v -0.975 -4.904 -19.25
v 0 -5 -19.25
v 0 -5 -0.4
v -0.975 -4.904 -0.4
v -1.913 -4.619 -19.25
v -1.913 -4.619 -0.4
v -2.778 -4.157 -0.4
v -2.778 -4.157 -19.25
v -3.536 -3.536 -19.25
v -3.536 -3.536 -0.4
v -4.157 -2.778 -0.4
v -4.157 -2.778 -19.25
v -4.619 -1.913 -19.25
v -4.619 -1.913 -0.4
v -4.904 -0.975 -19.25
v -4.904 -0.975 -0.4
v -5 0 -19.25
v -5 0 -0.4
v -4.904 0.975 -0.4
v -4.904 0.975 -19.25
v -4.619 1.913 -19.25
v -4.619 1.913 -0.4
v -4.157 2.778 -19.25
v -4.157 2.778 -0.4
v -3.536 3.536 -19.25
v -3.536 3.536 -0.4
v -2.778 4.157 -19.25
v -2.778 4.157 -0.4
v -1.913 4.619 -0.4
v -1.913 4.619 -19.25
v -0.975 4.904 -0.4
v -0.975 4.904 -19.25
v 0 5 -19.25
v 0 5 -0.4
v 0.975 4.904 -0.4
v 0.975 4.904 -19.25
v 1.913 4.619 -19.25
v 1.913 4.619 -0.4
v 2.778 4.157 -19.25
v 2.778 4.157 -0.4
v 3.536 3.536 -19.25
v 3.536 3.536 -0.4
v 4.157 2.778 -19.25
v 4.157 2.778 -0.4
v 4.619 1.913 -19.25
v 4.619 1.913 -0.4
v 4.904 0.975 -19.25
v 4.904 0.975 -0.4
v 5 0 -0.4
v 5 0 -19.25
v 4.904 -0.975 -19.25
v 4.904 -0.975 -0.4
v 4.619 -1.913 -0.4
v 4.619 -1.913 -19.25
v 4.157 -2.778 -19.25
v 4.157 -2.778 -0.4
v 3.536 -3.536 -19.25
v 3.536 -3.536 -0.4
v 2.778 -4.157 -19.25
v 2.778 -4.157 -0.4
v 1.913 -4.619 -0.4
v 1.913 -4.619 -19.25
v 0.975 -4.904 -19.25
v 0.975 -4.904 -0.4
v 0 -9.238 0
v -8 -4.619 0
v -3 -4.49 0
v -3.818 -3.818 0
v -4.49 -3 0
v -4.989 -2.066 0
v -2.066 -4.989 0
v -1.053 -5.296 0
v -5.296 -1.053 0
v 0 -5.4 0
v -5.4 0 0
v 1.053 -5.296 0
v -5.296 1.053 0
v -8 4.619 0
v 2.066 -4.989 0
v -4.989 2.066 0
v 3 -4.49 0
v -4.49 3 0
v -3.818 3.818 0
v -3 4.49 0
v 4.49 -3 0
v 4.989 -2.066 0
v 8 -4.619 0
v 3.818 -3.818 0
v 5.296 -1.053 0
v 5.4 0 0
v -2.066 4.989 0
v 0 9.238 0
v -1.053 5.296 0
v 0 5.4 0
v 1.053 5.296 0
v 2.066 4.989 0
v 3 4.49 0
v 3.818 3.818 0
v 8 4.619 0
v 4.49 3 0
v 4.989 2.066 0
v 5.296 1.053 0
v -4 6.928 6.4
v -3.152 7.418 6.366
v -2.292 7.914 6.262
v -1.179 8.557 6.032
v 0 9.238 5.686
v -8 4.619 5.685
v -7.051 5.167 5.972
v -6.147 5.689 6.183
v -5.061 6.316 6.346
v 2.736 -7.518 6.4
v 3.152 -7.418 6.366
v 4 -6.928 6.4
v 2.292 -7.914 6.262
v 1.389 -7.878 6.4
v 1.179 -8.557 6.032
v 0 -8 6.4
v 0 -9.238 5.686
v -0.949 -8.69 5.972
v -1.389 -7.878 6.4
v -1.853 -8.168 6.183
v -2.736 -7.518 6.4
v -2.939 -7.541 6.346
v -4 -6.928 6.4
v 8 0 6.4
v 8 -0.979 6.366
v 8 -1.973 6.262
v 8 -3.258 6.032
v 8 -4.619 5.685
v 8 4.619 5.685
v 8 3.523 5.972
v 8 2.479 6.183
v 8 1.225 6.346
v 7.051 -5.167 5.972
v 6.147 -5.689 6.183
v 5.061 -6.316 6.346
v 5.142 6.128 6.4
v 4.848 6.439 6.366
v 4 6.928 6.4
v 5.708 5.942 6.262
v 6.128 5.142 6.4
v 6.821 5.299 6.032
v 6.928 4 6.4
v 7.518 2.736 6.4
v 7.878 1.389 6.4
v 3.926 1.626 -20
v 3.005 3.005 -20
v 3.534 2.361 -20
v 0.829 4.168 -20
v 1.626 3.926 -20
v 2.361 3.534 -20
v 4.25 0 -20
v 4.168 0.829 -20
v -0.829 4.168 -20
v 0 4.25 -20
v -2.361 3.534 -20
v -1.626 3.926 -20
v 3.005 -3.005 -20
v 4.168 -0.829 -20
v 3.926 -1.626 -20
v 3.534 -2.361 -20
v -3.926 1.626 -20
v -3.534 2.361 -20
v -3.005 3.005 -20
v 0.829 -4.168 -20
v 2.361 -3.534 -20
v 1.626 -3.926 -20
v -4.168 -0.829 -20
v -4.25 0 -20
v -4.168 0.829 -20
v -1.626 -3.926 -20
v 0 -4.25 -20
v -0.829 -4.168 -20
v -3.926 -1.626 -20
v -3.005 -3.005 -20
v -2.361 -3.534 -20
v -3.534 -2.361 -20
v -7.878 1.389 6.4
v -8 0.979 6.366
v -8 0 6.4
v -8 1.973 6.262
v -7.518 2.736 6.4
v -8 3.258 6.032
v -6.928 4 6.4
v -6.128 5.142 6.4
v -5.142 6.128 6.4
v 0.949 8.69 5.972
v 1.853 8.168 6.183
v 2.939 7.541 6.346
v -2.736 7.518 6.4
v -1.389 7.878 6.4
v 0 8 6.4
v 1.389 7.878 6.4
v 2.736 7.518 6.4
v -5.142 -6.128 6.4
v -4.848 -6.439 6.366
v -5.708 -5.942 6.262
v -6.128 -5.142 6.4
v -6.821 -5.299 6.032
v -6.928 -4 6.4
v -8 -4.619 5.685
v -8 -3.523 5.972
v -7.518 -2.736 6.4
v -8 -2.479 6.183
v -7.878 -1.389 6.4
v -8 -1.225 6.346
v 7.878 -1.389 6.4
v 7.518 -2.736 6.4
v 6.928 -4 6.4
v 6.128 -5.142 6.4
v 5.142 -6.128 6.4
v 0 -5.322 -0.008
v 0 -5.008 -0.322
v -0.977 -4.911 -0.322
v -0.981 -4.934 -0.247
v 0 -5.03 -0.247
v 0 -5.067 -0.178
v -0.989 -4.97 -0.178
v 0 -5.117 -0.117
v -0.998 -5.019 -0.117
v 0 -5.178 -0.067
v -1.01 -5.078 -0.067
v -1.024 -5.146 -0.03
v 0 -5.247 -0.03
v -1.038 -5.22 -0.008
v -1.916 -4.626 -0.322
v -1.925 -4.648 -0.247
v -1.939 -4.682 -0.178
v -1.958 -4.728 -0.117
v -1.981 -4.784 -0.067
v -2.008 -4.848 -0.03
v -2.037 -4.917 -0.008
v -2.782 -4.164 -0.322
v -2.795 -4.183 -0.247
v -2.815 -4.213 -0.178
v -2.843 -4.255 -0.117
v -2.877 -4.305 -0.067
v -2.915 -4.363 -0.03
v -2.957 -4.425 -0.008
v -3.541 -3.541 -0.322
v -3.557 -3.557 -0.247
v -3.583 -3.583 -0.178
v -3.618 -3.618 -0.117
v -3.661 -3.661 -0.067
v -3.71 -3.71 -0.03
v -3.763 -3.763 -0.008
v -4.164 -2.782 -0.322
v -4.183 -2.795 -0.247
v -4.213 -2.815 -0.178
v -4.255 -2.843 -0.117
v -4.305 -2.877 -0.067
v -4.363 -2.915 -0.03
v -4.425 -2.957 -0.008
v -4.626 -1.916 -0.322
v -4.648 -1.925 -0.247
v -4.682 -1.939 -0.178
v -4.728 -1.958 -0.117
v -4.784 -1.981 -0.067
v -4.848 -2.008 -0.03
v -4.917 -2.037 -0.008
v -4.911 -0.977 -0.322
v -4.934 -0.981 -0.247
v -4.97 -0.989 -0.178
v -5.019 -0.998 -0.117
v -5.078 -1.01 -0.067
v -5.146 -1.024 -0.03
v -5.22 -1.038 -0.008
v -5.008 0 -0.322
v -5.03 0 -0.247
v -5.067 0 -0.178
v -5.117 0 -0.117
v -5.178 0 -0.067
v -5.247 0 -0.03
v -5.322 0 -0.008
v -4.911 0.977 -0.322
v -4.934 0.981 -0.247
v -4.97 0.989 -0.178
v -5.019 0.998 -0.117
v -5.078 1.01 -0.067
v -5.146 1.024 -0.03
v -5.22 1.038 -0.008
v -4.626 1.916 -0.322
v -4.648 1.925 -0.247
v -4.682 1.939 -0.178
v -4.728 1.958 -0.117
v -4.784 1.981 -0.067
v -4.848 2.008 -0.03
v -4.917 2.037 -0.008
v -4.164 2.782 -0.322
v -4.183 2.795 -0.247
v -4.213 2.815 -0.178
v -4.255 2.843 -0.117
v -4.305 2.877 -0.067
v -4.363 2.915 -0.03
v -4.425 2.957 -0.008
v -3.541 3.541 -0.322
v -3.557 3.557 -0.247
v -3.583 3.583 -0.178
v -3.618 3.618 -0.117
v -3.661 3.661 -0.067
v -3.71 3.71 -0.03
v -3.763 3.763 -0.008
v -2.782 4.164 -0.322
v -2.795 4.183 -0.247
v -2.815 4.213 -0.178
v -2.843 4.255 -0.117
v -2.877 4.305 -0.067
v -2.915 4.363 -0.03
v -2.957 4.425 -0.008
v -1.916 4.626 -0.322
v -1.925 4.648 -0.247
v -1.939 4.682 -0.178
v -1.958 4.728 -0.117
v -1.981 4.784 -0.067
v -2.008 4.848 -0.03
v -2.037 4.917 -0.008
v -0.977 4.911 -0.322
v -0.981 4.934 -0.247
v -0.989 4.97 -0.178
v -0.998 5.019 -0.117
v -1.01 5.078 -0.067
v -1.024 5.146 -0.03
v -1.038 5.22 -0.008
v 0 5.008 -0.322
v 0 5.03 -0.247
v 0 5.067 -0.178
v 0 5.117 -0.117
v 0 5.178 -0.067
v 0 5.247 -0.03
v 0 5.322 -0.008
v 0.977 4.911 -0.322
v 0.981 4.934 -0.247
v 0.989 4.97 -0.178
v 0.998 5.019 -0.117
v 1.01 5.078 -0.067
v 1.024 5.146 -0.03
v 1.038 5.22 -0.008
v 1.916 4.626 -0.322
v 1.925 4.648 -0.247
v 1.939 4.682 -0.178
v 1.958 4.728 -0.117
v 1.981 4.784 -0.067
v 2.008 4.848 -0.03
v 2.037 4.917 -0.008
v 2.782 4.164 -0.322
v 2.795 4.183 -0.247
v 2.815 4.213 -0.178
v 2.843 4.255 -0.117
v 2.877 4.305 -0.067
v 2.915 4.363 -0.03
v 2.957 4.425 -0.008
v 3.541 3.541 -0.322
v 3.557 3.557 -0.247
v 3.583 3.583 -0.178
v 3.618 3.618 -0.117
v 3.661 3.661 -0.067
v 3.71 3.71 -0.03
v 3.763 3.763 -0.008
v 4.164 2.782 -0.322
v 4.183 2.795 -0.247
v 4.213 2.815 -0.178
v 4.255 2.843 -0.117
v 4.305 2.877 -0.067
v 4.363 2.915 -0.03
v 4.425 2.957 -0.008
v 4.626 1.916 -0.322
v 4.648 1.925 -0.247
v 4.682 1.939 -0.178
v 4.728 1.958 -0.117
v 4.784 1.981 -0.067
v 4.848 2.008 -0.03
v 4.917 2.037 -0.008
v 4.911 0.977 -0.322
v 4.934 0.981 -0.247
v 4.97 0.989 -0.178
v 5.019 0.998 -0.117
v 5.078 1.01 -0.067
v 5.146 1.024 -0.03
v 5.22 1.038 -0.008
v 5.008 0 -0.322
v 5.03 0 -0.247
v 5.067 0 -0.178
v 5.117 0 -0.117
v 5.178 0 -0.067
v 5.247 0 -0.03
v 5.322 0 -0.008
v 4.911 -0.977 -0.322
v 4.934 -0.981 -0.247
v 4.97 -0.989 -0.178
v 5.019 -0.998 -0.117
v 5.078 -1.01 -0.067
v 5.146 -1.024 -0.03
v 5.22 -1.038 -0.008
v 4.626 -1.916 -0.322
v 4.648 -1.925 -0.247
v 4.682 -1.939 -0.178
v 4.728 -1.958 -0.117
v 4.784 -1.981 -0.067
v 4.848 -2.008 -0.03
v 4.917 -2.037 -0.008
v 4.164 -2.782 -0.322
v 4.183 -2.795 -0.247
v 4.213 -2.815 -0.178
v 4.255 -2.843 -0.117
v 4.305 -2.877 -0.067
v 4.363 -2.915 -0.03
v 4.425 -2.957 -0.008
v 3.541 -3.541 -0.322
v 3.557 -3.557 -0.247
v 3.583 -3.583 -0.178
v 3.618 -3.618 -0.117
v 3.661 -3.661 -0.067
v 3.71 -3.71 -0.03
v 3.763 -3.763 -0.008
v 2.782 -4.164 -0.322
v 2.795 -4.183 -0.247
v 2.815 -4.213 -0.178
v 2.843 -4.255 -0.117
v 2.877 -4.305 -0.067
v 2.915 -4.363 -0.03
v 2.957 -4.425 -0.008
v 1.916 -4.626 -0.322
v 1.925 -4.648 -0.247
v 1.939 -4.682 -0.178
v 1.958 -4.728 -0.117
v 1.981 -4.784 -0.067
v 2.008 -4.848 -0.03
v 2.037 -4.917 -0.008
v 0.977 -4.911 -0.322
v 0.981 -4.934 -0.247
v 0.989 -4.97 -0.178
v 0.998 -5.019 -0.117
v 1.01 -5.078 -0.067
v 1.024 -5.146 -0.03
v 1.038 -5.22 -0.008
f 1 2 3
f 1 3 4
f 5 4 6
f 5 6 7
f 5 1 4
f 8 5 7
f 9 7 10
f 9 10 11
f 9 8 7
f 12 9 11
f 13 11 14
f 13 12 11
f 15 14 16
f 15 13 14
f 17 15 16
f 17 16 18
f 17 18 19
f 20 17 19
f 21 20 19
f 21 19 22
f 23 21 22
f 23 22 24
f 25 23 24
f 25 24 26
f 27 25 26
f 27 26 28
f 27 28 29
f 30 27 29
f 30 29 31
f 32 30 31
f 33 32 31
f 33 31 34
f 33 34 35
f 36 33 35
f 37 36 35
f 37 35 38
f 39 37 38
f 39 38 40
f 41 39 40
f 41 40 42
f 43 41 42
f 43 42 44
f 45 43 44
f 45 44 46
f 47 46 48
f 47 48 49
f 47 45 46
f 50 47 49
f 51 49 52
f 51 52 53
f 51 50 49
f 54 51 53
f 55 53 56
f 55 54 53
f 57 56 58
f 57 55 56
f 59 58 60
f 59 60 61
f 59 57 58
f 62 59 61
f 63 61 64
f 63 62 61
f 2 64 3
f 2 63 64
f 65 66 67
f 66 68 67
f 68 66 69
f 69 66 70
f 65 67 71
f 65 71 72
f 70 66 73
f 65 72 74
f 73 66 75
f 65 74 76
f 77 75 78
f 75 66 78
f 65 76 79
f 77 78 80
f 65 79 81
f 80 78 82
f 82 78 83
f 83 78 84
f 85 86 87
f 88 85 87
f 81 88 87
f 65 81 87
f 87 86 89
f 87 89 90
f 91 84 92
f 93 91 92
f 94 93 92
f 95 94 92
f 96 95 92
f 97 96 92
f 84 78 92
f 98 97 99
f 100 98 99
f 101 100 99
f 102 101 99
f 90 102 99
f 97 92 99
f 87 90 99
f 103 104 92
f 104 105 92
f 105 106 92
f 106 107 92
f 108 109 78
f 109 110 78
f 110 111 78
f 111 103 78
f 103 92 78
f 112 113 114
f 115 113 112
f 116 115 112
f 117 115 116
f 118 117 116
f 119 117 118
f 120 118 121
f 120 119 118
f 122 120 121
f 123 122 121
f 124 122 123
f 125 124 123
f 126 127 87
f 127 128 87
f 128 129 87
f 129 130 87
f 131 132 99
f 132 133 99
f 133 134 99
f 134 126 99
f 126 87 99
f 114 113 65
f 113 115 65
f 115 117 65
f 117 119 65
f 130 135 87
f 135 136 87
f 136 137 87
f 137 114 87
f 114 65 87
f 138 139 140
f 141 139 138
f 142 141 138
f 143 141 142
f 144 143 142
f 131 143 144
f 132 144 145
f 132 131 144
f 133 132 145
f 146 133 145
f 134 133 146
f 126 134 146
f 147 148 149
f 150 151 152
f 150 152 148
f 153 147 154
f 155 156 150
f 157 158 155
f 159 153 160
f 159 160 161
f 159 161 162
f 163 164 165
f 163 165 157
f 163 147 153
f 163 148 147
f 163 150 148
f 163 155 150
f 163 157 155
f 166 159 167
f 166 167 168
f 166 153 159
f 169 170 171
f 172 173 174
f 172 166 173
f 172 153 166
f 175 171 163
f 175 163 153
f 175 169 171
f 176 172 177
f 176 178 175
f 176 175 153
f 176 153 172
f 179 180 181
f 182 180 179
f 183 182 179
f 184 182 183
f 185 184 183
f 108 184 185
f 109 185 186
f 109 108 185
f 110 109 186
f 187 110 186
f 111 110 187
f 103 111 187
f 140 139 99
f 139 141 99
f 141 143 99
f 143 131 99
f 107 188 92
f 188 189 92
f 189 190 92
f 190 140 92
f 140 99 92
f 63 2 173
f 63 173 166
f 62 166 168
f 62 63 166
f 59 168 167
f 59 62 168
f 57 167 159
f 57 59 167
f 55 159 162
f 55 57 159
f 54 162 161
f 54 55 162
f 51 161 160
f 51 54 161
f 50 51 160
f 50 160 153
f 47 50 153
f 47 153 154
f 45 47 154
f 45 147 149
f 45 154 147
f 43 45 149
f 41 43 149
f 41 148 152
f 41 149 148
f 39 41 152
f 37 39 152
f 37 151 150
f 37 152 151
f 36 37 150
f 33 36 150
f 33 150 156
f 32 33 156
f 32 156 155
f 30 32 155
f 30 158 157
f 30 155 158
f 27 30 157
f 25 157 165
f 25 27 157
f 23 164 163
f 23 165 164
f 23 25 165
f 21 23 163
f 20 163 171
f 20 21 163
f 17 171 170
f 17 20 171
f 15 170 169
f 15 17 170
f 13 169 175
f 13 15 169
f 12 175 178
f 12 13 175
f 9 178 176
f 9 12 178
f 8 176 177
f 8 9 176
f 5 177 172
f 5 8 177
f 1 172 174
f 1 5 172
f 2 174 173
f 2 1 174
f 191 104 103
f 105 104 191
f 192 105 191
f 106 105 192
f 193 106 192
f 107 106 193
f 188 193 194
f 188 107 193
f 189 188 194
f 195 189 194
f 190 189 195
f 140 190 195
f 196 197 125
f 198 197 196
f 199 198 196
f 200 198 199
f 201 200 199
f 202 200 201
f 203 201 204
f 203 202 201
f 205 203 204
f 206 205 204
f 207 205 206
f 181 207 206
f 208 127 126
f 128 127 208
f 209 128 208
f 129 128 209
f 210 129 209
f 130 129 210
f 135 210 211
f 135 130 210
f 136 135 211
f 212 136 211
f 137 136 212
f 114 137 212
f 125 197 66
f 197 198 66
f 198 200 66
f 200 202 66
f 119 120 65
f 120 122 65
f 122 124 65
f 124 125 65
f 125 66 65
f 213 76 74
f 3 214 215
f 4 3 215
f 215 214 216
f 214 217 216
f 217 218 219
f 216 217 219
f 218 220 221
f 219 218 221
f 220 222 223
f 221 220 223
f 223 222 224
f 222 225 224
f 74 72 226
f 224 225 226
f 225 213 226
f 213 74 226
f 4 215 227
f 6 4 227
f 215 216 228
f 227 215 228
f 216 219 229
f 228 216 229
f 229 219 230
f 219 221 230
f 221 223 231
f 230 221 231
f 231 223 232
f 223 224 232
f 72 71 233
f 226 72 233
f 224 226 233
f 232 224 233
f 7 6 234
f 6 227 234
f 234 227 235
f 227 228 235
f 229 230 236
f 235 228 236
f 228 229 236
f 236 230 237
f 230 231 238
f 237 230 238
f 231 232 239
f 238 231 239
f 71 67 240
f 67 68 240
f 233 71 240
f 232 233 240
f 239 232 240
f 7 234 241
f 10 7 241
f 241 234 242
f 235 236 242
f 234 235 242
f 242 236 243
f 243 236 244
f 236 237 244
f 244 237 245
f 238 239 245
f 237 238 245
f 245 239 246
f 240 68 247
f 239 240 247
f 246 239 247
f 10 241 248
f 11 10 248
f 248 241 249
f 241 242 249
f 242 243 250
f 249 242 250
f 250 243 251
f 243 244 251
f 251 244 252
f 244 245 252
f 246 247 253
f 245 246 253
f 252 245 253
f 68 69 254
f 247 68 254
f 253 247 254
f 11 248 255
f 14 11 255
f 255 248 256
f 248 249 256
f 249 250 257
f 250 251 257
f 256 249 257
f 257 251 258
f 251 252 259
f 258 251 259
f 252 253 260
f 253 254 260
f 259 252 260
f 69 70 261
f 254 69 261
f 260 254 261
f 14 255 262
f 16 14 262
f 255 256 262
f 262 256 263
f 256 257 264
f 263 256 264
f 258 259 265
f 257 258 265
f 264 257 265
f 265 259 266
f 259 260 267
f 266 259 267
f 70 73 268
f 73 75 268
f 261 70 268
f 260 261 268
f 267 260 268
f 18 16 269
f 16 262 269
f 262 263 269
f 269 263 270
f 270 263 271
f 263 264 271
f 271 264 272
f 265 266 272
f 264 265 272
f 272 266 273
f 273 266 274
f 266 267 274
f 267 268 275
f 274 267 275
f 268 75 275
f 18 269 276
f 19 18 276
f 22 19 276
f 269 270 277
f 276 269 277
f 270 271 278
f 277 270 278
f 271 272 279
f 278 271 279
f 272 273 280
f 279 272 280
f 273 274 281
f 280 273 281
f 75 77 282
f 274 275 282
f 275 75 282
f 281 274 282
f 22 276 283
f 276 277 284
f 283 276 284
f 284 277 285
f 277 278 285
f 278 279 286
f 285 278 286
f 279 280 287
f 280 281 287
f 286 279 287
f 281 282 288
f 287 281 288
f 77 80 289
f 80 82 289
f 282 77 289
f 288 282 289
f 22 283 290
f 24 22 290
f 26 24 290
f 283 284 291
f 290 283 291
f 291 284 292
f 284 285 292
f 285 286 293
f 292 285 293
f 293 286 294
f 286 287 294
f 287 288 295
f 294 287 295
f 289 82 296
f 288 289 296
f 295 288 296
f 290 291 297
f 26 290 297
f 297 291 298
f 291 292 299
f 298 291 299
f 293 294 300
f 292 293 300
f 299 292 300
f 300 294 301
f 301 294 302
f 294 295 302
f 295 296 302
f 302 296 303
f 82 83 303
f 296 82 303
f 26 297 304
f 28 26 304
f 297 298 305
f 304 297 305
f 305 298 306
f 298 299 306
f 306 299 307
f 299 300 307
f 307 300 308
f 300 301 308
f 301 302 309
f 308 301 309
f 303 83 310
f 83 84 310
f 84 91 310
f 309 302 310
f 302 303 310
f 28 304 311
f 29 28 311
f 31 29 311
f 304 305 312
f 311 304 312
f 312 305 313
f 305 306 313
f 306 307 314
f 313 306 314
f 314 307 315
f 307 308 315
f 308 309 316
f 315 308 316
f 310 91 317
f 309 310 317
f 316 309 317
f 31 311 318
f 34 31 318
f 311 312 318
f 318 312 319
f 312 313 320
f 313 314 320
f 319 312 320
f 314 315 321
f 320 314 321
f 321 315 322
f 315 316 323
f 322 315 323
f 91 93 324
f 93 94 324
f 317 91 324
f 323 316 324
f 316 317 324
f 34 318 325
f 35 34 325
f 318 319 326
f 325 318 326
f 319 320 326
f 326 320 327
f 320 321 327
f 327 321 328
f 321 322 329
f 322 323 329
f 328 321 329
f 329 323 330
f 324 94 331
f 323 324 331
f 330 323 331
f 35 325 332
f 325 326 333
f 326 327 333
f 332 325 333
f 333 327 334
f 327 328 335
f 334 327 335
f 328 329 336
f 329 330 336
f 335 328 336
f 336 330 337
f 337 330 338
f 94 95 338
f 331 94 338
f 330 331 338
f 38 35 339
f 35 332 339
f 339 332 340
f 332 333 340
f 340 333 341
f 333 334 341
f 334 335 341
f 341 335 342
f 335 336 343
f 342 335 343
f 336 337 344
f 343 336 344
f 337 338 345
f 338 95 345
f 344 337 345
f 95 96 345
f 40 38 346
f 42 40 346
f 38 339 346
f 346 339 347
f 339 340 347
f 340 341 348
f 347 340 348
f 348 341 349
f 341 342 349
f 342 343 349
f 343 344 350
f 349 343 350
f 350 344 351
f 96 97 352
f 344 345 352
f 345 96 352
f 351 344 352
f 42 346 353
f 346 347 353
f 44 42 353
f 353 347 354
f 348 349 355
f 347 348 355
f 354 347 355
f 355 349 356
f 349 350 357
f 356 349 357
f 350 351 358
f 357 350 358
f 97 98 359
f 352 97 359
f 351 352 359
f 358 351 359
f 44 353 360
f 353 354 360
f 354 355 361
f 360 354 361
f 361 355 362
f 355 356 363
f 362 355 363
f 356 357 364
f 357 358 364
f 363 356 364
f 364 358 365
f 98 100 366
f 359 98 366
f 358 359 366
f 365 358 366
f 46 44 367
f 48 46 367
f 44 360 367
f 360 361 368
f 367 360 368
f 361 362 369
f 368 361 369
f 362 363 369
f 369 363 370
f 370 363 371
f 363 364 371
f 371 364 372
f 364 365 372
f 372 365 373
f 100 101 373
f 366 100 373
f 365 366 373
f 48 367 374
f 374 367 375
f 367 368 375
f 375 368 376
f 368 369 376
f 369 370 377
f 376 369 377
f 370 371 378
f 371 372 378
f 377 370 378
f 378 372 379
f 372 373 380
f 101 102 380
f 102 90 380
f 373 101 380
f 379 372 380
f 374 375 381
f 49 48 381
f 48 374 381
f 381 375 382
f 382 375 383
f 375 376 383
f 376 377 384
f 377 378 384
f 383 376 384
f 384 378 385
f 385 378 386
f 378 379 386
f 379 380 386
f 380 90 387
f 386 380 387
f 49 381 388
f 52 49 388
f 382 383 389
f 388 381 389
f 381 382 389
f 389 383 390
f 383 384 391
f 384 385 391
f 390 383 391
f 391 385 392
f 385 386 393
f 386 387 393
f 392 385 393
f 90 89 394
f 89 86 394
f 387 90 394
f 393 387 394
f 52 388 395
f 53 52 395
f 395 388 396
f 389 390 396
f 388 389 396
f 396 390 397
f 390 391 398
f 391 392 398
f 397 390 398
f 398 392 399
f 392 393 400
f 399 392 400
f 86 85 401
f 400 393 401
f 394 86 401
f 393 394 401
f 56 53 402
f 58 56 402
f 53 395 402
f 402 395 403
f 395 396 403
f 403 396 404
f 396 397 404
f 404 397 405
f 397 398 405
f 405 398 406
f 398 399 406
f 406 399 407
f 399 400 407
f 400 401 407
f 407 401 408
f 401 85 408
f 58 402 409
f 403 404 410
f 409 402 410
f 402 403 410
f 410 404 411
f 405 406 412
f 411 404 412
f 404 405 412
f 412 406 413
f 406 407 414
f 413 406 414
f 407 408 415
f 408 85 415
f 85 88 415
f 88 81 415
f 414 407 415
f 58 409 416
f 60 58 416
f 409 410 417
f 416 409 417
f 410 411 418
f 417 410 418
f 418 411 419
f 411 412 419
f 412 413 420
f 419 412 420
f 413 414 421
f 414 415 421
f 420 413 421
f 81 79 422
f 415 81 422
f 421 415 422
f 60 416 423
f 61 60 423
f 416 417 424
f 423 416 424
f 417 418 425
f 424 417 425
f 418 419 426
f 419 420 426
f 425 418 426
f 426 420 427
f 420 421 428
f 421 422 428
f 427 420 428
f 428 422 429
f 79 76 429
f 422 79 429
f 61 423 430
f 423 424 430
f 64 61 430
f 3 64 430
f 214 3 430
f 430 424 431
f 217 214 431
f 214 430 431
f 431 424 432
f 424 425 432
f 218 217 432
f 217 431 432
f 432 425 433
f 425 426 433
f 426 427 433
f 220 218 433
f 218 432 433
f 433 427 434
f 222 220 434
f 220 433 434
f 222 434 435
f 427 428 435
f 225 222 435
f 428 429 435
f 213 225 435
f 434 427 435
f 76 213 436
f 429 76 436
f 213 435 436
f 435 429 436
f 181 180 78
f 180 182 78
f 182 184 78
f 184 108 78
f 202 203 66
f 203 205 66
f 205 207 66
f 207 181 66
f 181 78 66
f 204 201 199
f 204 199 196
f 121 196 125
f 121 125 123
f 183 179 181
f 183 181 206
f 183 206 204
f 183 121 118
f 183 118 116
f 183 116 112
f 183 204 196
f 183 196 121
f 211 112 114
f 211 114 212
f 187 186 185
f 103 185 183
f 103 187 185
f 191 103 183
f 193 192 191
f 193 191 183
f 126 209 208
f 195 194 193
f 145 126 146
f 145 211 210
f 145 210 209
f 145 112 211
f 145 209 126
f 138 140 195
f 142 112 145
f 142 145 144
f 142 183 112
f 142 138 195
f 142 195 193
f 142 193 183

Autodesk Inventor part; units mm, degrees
ref_plane "WorkPlane1" through (0, 0, 0) normal (0, 0, 1) x (1, 0, 0)
sketch "Sketch1" plane through (0, 0, 0) normal (0, 0, 1) x (1, 0, 0)
  point P0 (0, 0)
sketch "Sketch2" plane through (0, 0, 0) normal (0, 0, 1) x (1, 0, 0)
  line L0 (-8, 4.6189) -> (-8, -4.6189)
  line L1 (0, 9.2375) -> (-8, 4.6189)
  line L2 (8, 4.6189) -> (0, 9.2375)
  line L3 (8, -4.6189) -> (8, 4.6189)
  line L4 (0, -9.2375) -> (8, -4.6189)
  line L5 (-8, -4.6189) -> (0, -9.2375)
  circle A0 centre (0, 0) radius 8 construction
  dimension "d1" = 16
  dimension "d29" = 0
  dimension "d30" = 0
extrude "Extrusion1" add sketch "Sketch2" along normal blind 6.4
sketch "Sketch3" plane through (0, 0, 0) normal (1, 0, 0) x (0, 1, 0)
  line L0 (8, 6.4) -> (9.3375, 6.4)
  line L1 (9.3375, 5.6278) -> (8, 6.4)
  line L2 (9.3375, 6.4) -> (9.3375, 5.6278)
  line L3 (0, -1.28) -> (0, 7.68) projected
  line L4 (9.2375, 0) -> (9.2375, 6.4) projected
  dimension "d25" = 0.1
  dimension "d26" = 0
  dimension "d27" = 60
  dimension "d28" = 8
revolve "Revolution1" cut sketch "Sketch3" angle 360 about axis through (0, 0, -10) along (0, 0, 1)
sketch "Sketch4" plane through (0, 0, 0) normal (1, 0, 0) x (0, 1, 0)
  line L0 (0, -20) -> (0, 0)
  line L1 (-5, -20) -> (0, -20)
  line L2 (-5, 0) -> (-5, -20)
  line L3 (0, 0) -> (-5, 0)
  line L4 (0, -20) -> (0, 0)
  line L5 (-6, 0) -> (1, 0) projected
  line L6 (0, -24) -> (0, 4) projected
  dimension "d18" = 5
  dimension "d20" = 20
  dimension "d33" = 0
  dimension "d34" = 0
revolve "Revolution2" add sketch "Sketch4" angle 360 about axis through (0, 0, -20) along (0, 0, -1)
chamfer "Chamfer1" distance 0.75 angle 45 1 edges at (0, 5, -20)
fillet "Fillet1" radius 0.4 1 edges at (0, 5, 0)
thread "Thread1" size "M10x1.5" class "6g" standard "ISO Metric profile" length 17
ref_plane "MSC_PF1" through (0, 0, 0) normal (1, 0, 0) x (0, 1, 0)
ref_plane "MSC_PT1" through (0, 0, 0) normal (0, 0, -1) x (-1, 0, 0)
equation "\"d22\" = 0.5 * PTC"
equation "\"d23\" = 0.5 * PTC"
equation "\"d24\" = r"
equation "\"d1\" = ParS"
equation "\"d6\" = ParK"
equation "\"b\" = NLG - 2 * PTC"
equation "\"d28\" = 0.5 * ParS"
equation "\"d18\" = 0.5 * NND"
equation "\"d20\" = NLG"
equation "\"NLG\" = 20"
equation "\"PTC\" = 1.5"
equation "\"ParK\" = 6.4"
equation "\"ParS\" = 16"
equation "\"msp_es\" = 0.577367 * ParS"
equation "\"r\" = 0.4"
equation "\"NND\" = 10"
properties part number "ISO 4018 - M10 x 20" material "Steel"
